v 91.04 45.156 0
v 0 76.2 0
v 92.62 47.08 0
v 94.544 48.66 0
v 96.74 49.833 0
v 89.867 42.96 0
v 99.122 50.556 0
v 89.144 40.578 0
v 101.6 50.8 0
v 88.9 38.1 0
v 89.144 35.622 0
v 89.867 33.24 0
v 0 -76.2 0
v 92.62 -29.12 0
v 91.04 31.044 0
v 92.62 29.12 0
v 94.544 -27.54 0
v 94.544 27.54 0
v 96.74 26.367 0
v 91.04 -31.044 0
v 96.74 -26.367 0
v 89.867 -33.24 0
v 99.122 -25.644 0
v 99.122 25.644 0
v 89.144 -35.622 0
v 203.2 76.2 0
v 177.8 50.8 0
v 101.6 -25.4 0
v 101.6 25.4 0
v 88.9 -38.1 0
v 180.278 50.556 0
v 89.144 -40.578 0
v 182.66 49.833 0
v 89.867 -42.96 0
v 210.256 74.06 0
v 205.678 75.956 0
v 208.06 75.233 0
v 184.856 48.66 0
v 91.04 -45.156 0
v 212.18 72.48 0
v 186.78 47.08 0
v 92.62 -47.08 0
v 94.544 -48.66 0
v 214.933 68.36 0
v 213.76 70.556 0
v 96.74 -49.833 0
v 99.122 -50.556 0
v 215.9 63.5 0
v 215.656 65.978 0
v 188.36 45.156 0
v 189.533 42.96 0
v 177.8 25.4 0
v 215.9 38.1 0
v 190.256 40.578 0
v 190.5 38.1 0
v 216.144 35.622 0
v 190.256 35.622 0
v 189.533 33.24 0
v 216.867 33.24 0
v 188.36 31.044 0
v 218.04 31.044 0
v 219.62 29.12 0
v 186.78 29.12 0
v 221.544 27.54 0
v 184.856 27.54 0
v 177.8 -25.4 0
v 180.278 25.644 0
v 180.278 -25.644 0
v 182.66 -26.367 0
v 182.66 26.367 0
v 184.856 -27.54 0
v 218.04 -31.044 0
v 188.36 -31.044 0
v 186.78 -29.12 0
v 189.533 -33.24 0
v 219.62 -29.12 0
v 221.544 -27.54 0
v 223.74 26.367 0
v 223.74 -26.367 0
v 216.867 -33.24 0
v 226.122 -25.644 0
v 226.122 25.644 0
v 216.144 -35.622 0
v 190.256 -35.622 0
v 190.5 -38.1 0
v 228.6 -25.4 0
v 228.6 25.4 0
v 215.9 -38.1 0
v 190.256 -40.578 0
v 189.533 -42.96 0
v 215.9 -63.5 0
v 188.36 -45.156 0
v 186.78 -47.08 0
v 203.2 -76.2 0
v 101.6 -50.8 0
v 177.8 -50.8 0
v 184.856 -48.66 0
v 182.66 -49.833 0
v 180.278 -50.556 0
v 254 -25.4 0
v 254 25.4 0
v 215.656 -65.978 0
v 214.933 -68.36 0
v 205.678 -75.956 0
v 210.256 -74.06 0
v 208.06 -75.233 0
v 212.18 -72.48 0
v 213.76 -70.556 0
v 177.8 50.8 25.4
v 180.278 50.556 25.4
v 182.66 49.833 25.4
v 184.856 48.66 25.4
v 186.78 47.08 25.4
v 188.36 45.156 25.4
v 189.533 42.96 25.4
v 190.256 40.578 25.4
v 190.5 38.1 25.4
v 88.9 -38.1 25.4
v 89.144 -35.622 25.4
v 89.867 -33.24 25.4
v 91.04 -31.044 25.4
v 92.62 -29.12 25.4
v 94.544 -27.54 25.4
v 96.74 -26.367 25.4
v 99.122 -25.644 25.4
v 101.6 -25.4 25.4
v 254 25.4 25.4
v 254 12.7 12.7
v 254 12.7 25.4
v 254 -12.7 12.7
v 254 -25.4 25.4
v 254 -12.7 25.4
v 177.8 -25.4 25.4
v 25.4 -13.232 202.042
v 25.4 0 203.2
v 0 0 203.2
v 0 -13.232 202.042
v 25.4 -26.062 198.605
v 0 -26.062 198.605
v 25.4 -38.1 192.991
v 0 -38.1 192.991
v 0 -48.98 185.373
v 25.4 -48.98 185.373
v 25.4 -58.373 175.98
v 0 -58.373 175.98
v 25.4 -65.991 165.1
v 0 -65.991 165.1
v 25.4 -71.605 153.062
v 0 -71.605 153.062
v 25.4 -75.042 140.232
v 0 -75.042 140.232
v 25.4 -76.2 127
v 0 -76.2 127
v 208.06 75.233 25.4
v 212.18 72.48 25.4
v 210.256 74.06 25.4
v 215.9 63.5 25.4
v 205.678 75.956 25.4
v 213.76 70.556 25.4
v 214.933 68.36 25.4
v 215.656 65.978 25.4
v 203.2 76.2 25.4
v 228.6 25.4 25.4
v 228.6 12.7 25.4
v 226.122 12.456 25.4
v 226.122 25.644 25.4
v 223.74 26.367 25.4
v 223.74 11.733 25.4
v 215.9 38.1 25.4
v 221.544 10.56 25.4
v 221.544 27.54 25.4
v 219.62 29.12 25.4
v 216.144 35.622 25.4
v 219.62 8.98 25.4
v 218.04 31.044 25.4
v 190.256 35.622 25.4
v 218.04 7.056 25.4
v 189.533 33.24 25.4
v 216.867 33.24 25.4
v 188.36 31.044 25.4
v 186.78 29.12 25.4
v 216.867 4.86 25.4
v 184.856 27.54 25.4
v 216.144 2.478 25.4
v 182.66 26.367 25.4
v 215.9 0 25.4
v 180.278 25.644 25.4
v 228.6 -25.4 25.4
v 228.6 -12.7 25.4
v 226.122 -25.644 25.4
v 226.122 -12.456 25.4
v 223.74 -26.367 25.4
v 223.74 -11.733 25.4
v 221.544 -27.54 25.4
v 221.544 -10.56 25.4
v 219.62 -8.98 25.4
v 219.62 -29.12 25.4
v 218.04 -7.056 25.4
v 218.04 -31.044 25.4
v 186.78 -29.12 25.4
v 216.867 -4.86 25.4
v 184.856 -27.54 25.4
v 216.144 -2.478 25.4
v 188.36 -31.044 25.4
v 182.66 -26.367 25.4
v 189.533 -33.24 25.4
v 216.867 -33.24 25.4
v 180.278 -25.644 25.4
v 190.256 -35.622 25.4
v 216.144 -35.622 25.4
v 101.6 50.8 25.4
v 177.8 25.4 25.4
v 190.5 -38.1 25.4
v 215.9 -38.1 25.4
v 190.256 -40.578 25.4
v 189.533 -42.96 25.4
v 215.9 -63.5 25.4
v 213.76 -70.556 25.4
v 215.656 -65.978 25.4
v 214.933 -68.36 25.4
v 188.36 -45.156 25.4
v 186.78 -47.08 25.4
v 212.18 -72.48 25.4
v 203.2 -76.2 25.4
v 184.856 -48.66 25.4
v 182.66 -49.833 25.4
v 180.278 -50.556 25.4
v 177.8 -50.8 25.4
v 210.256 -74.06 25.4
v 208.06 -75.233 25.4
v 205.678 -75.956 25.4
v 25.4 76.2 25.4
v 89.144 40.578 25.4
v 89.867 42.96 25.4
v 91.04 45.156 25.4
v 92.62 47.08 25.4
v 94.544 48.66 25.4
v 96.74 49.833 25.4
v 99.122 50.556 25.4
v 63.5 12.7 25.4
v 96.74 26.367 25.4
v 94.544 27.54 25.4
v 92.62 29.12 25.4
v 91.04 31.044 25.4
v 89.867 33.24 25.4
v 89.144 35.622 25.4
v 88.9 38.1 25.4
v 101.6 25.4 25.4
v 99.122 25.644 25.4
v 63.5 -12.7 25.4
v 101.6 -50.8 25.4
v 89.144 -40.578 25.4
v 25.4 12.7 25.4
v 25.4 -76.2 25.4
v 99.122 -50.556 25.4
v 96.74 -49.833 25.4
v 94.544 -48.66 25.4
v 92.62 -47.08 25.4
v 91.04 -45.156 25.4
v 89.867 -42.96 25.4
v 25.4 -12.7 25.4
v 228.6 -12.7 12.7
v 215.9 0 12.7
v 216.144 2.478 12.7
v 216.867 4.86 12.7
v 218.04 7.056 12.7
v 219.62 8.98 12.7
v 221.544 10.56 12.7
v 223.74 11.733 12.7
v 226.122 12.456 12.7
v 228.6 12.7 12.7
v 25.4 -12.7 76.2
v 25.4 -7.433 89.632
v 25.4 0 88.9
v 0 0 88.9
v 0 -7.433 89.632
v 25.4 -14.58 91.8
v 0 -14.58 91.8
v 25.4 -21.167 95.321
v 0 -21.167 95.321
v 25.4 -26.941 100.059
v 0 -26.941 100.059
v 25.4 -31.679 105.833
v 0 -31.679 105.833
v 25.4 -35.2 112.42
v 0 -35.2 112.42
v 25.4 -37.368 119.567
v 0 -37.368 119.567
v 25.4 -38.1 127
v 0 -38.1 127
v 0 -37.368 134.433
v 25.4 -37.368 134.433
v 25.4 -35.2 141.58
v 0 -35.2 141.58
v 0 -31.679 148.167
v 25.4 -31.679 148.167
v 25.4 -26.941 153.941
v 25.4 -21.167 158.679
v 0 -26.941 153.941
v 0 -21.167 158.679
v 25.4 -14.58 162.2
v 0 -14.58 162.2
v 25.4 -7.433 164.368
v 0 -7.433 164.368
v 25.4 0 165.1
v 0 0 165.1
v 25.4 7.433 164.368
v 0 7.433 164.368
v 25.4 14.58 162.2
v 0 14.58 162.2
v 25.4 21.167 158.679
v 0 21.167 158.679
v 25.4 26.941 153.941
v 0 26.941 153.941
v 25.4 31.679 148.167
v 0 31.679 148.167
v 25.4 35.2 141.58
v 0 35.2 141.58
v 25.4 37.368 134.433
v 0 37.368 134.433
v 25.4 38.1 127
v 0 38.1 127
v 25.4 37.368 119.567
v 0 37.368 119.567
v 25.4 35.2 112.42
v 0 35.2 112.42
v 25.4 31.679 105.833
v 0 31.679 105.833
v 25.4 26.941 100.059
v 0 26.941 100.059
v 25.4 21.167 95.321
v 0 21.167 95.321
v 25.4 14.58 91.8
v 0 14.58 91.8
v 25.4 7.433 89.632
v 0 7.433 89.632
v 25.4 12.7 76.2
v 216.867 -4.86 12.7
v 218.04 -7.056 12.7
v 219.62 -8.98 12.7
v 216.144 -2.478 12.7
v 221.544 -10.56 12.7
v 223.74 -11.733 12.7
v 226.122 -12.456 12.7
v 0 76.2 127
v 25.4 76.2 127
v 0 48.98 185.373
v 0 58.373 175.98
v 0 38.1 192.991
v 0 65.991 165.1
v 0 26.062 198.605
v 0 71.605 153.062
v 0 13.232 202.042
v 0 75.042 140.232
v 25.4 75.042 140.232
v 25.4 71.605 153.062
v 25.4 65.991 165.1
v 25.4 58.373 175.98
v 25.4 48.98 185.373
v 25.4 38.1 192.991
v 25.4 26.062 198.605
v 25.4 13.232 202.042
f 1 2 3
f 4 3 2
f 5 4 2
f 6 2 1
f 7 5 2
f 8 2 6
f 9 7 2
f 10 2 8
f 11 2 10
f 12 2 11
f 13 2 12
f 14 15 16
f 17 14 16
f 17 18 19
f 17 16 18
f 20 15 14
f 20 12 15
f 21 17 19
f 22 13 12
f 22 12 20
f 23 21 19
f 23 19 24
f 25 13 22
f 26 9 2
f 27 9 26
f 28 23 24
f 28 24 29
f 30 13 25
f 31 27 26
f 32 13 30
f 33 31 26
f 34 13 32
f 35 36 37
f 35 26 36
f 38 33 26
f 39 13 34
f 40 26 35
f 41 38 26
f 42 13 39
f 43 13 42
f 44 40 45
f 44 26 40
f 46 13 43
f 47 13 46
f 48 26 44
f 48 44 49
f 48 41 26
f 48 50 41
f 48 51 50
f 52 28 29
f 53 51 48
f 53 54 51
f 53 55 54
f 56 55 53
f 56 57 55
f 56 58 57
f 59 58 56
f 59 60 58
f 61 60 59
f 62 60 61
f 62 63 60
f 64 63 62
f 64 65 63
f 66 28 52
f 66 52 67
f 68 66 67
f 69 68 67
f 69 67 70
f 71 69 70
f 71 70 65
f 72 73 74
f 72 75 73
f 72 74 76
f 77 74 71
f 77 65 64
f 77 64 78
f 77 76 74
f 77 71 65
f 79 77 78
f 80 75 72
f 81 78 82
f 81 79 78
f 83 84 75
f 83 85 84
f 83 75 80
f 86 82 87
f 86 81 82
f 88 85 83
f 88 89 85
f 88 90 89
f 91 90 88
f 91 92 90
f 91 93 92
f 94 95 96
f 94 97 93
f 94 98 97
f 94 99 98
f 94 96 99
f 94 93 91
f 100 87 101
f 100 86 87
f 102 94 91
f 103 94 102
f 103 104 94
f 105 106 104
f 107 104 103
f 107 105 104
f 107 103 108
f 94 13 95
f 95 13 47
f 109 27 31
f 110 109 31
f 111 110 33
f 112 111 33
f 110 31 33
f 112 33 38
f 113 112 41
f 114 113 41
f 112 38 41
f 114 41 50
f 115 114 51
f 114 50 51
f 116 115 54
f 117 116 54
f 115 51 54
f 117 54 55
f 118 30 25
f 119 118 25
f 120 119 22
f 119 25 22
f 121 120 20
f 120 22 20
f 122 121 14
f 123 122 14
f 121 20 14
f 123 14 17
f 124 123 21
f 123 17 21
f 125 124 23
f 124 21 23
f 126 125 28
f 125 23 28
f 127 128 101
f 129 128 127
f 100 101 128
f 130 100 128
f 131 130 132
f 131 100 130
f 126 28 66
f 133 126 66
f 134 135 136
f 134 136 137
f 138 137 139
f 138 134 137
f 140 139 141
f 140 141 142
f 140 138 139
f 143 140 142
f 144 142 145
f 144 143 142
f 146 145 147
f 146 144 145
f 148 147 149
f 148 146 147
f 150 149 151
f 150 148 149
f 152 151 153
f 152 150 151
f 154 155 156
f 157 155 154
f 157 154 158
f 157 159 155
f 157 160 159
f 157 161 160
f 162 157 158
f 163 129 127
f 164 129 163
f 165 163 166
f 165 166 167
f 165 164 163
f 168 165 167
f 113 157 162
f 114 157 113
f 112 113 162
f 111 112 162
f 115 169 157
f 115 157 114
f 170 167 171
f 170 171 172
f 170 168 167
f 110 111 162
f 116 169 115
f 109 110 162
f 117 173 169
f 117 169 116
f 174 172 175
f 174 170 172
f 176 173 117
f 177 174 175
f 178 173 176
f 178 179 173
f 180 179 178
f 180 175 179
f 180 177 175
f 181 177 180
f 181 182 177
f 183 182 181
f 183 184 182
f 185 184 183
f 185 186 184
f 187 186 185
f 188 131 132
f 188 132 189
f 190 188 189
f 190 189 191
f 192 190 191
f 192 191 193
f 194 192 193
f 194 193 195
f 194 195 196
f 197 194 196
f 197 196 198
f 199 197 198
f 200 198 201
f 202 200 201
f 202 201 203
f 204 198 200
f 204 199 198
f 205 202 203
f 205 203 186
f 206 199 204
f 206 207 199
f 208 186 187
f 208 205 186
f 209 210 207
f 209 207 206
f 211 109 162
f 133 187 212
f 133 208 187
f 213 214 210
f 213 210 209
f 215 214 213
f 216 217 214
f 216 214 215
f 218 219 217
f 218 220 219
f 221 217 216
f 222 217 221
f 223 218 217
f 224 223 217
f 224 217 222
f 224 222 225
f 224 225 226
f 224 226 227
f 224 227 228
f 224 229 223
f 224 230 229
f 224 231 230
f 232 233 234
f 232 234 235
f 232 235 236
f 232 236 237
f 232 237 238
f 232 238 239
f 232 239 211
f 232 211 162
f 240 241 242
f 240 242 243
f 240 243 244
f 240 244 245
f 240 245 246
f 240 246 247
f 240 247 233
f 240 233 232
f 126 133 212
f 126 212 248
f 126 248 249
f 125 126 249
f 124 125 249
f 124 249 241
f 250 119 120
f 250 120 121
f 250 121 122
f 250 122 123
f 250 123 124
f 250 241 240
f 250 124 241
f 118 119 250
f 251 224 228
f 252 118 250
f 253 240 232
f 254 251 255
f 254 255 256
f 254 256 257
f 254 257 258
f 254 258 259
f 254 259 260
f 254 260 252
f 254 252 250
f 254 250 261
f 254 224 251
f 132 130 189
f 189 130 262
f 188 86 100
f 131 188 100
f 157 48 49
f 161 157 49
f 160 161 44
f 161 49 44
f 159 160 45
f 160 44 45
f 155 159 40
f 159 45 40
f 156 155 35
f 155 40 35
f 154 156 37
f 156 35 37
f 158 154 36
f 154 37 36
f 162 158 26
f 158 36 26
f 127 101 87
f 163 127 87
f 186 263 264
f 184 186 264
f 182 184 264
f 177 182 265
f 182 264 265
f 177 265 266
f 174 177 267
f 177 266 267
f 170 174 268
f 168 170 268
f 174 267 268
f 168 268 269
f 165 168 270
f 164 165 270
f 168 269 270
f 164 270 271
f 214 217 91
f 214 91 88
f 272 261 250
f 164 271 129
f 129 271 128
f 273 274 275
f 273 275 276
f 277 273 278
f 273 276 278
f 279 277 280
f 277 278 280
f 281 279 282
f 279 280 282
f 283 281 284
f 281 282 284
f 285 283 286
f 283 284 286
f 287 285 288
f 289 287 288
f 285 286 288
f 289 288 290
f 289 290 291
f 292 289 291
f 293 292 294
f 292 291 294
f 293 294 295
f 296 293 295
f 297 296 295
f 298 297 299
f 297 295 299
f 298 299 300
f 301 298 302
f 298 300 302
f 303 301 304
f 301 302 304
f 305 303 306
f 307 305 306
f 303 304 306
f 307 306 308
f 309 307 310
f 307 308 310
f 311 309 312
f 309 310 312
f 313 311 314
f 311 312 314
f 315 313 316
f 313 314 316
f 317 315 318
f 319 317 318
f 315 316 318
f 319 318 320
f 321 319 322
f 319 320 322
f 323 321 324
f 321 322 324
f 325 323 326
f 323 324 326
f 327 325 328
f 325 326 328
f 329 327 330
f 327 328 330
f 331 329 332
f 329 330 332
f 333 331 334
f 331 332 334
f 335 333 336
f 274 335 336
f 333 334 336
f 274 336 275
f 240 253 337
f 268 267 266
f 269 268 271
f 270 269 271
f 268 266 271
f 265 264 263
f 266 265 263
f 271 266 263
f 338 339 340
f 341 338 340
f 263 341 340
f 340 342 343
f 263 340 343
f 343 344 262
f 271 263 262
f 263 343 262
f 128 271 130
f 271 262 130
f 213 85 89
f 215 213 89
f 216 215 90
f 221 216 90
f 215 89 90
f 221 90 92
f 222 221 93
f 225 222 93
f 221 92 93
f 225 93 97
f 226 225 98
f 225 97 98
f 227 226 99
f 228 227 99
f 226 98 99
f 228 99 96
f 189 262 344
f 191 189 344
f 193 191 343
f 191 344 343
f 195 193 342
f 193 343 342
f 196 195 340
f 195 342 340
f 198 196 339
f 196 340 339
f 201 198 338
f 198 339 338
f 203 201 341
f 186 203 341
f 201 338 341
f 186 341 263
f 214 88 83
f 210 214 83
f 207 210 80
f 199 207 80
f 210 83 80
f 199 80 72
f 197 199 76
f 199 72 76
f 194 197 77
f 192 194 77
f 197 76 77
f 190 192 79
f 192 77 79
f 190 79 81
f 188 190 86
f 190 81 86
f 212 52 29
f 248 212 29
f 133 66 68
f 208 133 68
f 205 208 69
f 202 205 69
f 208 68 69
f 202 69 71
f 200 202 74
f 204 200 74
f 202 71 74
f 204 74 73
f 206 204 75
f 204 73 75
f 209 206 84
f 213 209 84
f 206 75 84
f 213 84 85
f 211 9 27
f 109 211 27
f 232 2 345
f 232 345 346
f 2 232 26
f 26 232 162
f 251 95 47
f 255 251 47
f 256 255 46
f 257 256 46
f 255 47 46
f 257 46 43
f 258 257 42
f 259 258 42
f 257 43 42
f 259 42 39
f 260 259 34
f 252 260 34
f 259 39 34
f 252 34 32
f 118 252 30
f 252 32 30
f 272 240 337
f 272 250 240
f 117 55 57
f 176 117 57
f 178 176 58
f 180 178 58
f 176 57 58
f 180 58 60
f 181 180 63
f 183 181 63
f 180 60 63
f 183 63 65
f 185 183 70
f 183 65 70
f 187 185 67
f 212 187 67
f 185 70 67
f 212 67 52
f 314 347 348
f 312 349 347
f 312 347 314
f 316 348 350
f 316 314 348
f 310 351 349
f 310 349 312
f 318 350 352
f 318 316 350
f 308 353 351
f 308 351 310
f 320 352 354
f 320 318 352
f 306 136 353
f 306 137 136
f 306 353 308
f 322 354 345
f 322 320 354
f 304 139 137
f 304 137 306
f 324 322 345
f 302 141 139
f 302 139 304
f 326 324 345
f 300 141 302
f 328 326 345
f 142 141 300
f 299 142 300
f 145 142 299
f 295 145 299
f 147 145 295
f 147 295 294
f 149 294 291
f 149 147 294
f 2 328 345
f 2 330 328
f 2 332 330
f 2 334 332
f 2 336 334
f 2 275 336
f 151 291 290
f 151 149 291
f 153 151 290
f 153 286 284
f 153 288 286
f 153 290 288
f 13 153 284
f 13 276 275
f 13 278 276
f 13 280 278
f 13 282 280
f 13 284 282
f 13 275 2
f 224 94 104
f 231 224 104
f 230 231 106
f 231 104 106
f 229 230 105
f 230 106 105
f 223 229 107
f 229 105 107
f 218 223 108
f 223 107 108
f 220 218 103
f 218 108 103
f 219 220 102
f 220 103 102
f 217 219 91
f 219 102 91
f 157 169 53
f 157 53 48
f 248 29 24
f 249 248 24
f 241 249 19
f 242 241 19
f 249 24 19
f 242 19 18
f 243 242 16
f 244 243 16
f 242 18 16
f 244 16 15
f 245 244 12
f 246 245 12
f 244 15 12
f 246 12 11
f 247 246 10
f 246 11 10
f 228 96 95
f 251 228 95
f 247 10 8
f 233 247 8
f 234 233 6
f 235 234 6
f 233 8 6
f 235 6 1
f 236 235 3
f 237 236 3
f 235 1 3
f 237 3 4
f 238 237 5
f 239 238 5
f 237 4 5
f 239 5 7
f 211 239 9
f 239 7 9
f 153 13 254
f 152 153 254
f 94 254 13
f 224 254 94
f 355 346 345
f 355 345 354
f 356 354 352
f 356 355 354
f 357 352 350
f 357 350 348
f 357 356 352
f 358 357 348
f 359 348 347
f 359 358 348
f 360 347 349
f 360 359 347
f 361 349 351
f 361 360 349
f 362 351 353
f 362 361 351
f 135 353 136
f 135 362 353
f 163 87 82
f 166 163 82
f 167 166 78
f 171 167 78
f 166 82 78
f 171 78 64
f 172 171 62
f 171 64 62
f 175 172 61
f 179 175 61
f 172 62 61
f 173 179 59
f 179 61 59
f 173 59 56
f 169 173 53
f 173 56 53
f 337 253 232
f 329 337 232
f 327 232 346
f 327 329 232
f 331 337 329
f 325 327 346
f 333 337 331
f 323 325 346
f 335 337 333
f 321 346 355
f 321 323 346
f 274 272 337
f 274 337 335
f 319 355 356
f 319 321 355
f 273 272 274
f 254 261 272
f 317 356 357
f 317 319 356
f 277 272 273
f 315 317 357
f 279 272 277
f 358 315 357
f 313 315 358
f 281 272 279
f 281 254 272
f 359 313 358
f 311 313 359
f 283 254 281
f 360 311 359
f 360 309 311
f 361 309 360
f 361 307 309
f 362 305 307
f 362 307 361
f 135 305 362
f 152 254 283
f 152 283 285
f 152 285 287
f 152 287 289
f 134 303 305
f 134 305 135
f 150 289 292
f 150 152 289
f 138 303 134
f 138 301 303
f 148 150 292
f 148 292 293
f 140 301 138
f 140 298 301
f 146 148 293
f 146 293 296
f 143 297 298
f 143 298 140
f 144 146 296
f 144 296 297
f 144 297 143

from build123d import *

# Parameters (mm, degrees)
F1_DEPTH = 76.2
F2_DEPTH = 12.7
F4_DEPTH = 1270
F6_DEPTH = 70.612
F7_START = -12.7
F7_DEPTH = 43.434


with BuildPart() as f1:
    # F0 (on Front) → F1 (new body, symmetric)
    with BuildSketch(Plane.XZ):
        Polygon((0, 203.2), (0, 0), (254, 0), (254, 25.4), (63.5, 25.4), (25.4, 25.4), (25.4, 76.2), (25.4, 203.2), align=None)
    extrude(amount=F1_DEPTH, both=True)

    # F0 (on Front) → F2 (join, symmetric)
    with BuildSketch(Plane.XZ):
        Polygon((63.5, 25.4), (25.4, 76.2), (25.4, 25.4), align=None)
    extrude(amount=F2_DEPTH, both=True)

    # F3 (on face) → F4 (cut, symmetric)
    with BuildSketch(Plane(origin=(0, 0, 0), x_dir=(0, -1, 0), z_dir=(-1, 0, 0))):
        with BuildLine():
            Line((-76.2, 203.2), (-76.2, 127))
            ThreePointArc((-76.2, 127), (-53.8815367264, 180.8815367264), (0, 203.2))
            Line((0, 203.2), (-76.2, 203.2))
        make_face()
        with BuildLine():
            Line((76.2, 203.2), (0, 203.2))
            ThreePointArc((0, 203.2), (53.8815367264, 180.8815367264), (76.2, 127))
            Line((76.2, 127), (76.2, 203.2))
        make_face()
        with BuildLine():
            ThreePointArc((38.1, 127), (-26.9407683632, 153.9407683632), (0, 88.9))
            ThreePointArc((0, 88.9), (26.9407683632, 100.0592316368), (38.1, 127))
        make_face()
    extrude(amount=F4_DEPTH, both=True, mode=Mode.SUBTRACT)

    # F5 (on face) → F6 (cut)
    with BuildSketch(Plane(origin=(0, 0, 0), x_dir=(1, 0, 0), z_dir=(0, 0, -1))):
        with BuildLine():
            ThreePointArc((203.2, 76.2), (212.1802561211, 72.4802561211), (215.9, 63.5))
            Line((215.9, 63.5), (215.9, 38.1))
            ThreePointArc((215.9, 38.1), (219.6197438789, 29.1197438789), (228.6, 25.4))
            Line((228.6, 25.4), (241.3, 25.4))
            Line((241.3, 25.4), (254, 25.4))
            Line((254, 25.4), (254, 76.2))
            Line((254, 76.2), (203.2, 76.2))
        make_face()
        with BuildLine():
            ThreePointArc((88.9, 38.1), (92.6197438789, 29.1197438789), (101.6, 25.4))
            Line((101.6, 25.4), (177.8, 25.4))
            ThreePointArc((177.8, 25.4), (186.7802561211, 29.1197438789), (190.5, 38.1))
            ThreePointArc((190.5, 38.1), (186.7802561211, 47.0802561211), (177.8, 50.8))
            Line((177.8, 50.8), (101.6, 50.8))
            ThreePointArc((101.6, 50.8), (92.6197438789, 47.0802561211), (88.9, 38.1))
        make_face()
        with BuildLine():
            ThreePointArc((101.6, -25.4), (92.6197438789, -29.1197438789), (88.9, -38.1))
            ThreePointArc((88.9, -38.1), (92.6197438789, -47.0802561211), (101.6, -50.8))
            Line((101.6, -50.8), (177.8, -50.8))
            ThreePointArc((177.8, -50.8), (186.7802561211, -47.0802561211), (190.5, -38.1))
            ThreePointArc((190.5, -38.1), (186.7802561211, -29.1197438789), (177.8, -25.4))
            Line((177.8, -25.4), (101.6, -25.4))
        make_face()
        with BuildLine():
            Line((254, -25.4), (241.3, -25.4))
            Line((241.3, -25.4), (228.6, -25.4))
            ThreePointArc((228.6, -25.4), (219.6197438789, -29.1197438789), (215.9, -38.1))
            Line((215.9, -38.1), (215.9, -63.5))
            ThreePointArc((215.9, -63.5), (212.1802561211, -72.4802561211), (203.2, -76.2))
            Line((203.2, -76.2), (254, -76.2))
            Line((254, -76.2), (254, -25.4))
        make_face()
    extrude(amount=-F6_DEPTH, mode=Mode.SUBTRACT)

    # F5 (on face) → F7 (cut)
    with BuildSketch(Plane(origin=(0, 0, 0), x_dir=(1, 0, 0), z_dir=(0, 0, -1)).offset(F7_START)):
        with BuildLine():
            Line((254, 0), (254, 12.7))
            Line((254, 12.7), (228.6, 12.7))
            ThreePointArc((228.6, 12.7), (219.6197438789, 8.9802561211), (215.9, 0))
            ThreePointArc((215.9, 0), (219.6197438789, -8.9802561211), (228.6, -12.7))
            Line((228.6, -12.7), (254, -12.7))
            Line((254, -12.7), (254, 0))
        make_face()
    extrude(amount=-F7_DEPTH, mode=Mode.SUBTRACT)


solid = f1.part
